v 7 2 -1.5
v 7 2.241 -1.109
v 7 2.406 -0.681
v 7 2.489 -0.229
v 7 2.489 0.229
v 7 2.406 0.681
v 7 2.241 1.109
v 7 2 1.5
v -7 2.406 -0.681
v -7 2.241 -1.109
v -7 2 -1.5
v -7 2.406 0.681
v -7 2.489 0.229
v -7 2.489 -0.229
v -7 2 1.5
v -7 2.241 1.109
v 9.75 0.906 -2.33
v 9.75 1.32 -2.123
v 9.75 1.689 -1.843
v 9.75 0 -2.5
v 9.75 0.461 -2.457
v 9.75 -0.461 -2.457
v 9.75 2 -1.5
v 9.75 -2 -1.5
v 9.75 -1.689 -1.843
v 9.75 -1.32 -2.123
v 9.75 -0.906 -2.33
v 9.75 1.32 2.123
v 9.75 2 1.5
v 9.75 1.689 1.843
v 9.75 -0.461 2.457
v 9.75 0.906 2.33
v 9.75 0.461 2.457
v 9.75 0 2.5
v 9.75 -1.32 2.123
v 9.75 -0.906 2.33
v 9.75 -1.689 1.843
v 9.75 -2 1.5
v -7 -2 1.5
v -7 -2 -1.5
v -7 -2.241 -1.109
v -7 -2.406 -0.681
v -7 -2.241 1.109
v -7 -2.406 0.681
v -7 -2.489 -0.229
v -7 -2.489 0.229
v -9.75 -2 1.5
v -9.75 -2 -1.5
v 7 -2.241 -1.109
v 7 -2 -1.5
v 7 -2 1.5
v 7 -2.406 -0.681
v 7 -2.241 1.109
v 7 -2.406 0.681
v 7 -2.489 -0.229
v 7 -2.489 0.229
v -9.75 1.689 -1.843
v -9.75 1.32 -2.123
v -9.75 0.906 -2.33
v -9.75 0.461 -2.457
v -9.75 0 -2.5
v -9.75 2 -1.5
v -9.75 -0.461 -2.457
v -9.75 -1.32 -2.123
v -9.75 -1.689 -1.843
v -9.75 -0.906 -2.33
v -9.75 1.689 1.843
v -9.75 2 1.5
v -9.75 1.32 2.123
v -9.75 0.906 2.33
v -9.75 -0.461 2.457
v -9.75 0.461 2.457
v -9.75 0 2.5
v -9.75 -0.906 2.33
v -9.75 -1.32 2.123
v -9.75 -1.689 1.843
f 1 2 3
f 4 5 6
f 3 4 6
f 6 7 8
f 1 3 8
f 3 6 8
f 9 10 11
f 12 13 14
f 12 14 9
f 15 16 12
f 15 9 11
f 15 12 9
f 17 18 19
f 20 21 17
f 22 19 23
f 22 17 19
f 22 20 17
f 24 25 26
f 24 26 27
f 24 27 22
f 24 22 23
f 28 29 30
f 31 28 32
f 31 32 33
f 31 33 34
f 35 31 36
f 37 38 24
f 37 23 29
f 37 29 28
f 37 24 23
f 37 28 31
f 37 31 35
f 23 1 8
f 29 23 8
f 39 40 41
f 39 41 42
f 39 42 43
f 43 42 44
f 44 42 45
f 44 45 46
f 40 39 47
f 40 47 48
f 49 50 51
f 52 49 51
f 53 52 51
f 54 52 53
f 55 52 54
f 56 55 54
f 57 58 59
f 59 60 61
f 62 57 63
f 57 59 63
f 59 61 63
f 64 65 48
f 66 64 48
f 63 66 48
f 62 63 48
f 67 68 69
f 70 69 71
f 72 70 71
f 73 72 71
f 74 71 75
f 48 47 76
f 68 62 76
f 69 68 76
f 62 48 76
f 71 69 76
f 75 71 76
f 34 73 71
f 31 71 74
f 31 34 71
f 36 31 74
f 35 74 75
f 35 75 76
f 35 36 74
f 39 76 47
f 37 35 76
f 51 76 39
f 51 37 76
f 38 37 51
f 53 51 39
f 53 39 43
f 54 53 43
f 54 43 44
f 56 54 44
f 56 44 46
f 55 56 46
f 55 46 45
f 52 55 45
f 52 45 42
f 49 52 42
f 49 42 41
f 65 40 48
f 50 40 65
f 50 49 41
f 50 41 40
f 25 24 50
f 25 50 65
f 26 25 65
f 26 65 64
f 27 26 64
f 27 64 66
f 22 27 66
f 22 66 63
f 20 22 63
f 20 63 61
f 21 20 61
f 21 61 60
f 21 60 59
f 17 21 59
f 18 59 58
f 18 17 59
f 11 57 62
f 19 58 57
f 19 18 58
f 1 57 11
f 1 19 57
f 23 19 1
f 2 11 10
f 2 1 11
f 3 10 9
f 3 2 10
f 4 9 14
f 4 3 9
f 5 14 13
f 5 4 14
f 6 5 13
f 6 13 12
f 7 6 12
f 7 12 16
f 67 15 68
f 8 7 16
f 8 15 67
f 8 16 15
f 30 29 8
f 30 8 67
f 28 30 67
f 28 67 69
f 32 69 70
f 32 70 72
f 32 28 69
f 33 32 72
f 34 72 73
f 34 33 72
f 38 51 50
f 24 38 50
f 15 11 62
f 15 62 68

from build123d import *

# Parameters (mm, degrees)
SKETCH1_R           = 2.5
BOSS_EXTRUDE1_DEPTH = 9.75
CUT_EXTRUDE1_START  = -2.749999999
CUT_EXTRUDE1_DEPTH  = 2.749999999


with BuildPart() as part:
    # Sketch1 → Boss-Extrude1 (new, symmetric)
    with BuildSketch(Plane(origin=(0, 0, 0), x_dir=(0, 0, -1), z_dir=(1, 0, 0))):
        with Locations(Location((0, 0, 0), (0, 0, 180))):
            Circle(SKETCH1_R)
    extrude(amount=BOSS_EXTRUDE1_DEPTH, both=True)

    # Sketch2 → Cut-Extrude1 (cut)
    with BuildSketch(Plane.ZY.offset(9.75).offset(CUT_EXTRUDE1_START)):
        with BuildLine():
            Line((-1.5, 2), (1.5, 2))
            ThreePointArc((1.5, 2), (0, 2.5), (-1.5, 2))
        make_face()
        with BuildLine():
            Line((1.5, -2), (-1.5, -2))
            ThreePointArc((-1.5, -2), (0, -2.5), (1.5, -2))
        make_face()
    cut_extrude1 = extrude(amount=CUT_EXTRUDE1_DEPTH, mode=Mode.SUBTRACT)

    # Mirror1: Cut-Extrude1 across plane
    add(cut_extrude1.mirror(Plane(origin=(0, 0, 0), x_dir=(0, 0, 1), z_dir=(1, 0, 0))), mode=Mode.SUBTRACT)


solid = part.part
